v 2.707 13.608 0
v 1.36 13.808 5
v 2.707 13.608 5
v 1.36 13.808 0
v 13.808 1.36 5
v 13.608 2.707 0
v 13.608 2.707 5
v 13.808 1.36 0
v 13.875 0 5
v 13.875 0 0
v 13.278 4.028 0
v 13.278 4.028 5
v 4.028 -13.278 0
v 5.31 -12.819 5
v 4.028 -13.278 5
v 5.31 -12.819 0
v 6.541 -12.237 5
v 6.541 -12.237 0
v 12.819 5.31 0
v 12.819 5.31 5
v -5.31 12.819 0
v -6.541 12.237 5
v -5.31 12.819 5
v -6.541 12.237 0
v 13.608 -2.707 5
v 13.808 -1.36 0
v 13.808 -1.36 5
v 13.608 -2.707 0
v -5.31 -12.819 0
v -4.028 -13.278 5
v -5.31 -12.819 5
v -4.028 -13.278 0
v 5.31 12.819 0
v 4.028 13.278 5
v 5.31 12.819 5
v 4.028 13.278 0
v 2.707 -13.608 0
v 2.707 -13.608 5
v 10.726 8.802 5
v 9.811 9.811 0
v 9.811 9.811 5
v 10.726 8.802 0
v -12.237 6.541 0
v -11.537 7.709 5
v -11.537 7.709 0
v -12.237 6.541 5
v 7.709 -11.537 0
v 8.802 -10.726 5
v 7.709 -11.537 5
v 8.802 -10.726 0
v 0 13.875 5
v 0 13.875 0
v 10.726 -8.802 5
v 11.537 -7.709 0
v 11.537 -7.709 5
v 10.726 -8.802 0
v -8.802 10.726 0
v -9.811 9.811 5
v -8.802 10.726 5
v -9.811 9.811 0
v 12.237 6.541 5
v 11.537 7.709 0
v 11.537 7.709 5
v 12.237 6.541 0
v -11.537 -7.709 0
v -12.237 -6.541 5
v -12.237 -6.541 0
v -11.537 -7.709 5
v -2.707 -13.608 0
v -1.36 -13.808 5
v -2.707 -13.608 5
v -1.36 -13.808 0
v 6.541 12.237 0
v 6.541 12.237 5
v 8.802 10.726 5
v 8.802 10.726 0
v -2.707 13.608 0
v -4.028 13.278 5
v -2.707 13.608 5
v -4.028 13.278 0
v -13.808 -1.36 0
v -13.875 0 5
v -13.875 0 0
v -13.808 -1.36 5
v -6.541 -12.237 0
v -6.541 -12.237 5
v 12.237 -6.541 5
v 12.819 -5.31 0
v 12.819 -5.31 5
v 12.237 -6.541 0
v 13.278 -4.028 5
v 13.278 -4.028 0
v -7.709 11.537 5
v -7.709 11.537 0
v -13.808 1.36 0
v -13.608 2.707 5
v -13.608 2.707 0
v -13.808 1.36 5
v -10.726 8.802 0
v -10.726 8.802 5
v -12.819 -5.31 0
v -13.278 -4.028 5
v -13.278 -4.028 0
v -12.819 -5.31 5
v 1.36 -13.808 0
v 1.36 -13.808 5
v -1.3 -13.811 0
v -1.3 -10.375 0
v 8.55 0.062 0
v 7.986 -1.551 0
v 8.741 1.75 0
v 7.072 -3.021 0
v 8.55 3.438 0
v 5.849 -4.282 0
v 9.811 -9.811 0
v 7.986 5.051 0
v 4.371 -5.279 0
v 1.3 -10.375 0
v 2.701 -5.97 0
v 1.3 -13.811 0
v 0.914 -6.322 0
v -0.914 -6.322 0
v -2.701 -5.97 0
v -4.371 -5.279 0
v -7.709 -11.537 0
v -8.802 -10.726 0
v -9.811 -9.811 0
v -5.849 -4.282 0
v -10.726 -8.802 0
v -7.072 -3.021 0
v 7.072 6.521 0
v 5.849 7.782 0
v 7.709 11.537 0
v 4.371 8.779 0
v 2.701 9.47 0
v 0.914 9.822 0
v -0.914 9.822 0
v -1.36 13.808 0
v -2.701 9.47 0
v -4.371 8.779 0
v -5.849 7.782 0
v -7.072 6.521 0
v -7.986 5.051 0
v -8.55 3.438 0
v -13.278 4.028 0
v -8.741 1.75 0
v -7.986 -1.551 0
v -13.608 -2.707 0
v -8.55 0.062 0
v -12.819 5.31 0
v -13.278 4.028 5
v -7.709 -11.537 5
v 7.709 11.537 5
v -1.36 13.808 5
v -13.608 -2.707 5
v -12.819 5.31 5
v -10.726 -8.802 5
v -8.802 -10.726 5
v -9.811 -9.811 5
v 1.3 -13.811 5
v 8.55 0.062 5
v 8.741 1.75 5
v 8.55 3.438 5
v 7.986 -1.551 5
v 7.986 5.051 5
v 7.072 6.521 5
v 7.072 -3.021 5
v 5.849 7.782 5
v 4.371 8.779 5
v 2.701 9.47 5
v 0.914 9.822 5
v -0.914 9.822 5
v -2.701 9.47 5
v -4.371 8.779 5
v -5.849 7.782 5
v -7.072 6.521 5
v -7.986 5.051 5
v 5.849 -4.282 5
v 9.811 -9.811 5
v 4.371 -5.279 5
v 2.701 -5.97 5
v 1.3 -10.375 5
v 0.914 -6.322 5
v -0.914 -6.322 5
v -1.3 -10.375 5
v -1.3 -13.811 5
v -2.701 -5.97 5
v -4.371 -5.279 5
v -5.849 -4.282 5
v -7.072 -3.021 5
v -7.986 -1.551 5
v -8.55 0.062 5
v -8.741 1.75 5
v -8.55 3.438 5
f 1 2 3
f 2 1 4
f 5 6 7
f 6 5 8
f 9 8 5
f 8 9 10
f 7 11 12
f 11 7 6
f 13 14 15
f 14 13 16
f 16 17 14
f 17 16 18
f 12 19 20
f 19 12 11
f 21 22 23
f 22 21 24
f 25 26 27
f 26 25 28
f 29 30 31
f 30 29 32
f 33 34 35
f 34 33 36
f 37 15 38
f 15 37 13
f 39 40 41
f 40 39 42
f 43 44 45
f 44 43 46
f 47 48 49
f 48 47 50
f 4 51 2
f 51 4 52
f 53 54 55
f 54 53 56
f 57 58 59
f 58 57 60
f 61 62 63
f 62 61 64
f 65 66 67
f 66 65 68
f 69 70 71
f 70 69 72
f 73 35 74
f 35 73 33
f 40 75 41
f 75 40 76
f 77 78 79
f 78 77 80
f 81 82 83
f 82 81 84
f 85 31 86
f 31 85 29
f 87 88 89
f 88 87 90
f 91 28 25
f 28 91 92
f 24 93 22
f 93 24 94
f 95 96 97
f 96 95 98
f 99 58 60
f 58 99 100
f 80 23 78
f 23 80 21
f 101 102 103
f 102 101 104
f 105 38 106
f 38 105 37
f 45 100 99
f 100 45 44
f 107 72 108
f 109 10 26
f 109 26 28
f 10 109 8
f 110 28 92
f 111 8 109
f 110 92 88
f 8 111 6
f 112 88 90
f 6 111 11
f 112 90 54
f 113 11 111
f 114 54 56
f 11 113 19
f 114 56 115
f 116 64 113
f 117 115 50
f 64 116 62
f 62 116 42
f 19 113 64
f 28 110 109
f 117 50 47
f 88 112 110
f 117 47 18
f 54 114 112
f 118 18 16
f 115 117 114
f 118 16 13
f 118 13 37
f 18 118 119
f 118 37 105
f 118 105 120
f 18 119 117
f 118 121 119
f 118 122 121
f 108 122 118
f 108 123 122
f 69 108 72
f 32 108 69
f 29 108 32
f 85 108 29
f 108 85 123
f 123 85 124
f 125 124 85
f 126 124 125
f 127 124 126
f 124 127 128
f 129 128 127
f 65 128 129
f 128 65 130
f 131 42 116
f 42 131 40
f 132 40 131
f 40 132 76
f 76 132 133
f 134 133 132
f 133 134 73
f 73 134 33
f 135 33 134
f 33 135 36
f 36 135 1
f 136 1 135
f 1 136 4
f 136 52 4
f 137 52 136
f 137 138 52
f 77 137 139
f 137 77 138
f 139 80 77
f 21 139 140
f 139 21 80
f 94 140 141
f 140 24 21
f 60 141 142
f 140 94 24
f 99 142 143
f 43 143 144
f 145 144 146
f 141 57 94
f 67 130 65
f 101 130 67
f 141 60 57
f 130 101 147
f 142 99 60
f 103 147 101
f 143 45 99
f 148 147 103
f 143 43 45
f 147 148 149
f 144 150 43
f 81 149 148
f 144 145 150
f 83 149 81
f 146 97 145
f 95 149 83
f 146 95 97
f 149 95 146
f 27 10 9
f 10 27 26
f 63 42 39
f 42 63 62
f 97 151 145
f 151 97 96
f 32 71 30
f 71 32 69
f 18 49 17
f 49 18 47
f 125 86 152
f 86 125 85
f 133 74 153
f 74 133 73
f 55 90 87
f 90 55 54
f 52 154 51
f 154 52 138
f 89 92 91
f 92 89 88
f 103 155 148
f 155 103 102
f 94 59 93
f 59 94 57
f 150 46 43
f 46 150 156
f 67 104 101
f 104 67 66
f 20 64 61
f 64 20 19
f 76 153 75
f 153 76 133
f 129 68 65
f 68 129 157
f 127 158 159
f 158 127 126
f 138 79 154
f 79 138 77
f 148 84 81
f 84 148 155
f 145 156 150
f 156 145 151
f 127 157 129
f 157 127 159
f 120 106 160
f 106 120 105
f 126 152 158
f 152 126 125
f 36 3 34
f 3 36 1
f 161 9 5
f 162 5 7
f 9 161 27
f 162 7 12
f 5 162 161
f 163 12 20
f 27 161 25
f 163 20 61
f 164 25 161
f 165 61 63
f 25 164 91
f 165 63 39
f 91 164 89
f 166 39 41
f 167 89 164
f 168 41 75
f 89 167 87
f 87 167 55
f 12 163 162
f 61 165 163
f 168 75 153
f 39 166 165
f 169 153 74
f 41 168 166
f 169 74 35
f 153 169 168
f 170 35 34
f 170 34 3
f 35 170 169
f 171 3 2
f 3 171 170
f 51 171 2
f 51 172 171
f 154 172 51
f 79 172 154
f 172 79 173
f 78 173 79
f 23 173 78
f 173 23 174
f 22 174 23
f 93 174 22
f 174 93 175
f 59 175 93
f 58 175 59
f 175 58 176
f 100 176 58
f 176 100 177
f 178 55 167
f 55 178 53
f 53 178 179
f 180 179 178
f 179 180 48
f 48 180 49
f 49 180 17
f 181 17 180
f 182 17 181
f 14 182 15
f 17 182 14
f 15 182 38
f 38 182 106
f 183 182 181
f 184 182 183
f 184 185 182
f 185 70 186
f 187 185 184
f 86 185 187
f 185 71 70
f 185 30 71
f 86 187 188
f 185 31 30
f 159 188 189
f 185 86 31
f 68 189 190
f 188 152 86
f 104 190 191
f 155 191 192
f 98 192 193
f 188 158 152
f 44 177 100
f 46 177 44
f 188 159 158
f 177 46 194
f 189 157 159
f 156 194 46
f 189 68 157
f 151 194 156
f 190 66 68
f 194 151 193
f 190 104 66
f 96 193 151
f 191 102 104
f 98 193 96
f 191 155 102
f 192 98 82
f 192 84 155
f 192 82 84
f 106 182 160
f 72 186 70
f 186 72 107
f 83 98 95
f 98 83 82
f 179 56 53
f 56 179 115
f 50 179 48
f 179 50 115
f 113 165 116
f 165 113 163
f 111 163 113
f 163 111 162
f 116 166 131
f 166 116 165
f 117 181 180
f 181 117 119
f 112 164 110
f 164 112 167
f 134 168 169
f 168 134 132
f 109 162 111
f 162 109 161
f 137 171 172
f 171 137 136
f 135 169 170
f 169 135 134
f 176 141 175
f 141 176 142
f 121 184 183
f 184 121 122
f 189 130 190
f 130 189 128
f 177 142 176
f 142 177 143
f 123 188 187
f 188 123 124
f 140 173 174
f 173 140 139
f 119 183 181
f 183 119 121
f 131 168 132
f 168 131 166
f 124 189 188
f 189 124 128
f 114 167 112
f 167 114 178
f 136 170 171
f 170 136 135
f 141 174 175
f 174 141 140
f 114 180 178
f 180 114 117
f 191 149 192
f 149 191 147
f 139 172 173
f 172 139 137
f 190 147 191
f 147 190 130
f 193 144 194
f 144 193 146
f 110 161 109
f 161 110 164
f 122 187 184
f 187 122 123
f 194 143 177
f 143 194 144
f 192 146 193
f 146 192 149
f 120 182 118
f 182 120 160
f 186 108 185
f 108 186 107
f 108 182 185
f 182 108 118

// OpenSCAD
// file: common.scad
cavity_d = 27.75; // abs
cavity_l = 122;

outer_ridge_d = 31;
outer_ridge_min_t = 4.5;
outer_ridge_max_t = 8.5;

locating_pin_h = 3.5;
locating_pin_w = 2.6; // abs

outer_d = cavity_d * 1.2;
outer_l = cavity_l * 1.1;

ff = 0.01;
// main file
include <common.scad>;

cavity_l = 5;

difference() {
  cylinder(d=cavity_d, h=cavity_l, $fn=64);
  translate([0, locating_pin_h/2, -ff]) scale([0.7, 0.65, 1]) cylinder(d=cavity_d*0.9, h=cavity_l+(ff*2));

  translate([-locating_pin_w/2, -cavity_d/2, -ff]) cube([locating_pin_w, locating_pin_h, cavity_l+(ff*2)]);
}
